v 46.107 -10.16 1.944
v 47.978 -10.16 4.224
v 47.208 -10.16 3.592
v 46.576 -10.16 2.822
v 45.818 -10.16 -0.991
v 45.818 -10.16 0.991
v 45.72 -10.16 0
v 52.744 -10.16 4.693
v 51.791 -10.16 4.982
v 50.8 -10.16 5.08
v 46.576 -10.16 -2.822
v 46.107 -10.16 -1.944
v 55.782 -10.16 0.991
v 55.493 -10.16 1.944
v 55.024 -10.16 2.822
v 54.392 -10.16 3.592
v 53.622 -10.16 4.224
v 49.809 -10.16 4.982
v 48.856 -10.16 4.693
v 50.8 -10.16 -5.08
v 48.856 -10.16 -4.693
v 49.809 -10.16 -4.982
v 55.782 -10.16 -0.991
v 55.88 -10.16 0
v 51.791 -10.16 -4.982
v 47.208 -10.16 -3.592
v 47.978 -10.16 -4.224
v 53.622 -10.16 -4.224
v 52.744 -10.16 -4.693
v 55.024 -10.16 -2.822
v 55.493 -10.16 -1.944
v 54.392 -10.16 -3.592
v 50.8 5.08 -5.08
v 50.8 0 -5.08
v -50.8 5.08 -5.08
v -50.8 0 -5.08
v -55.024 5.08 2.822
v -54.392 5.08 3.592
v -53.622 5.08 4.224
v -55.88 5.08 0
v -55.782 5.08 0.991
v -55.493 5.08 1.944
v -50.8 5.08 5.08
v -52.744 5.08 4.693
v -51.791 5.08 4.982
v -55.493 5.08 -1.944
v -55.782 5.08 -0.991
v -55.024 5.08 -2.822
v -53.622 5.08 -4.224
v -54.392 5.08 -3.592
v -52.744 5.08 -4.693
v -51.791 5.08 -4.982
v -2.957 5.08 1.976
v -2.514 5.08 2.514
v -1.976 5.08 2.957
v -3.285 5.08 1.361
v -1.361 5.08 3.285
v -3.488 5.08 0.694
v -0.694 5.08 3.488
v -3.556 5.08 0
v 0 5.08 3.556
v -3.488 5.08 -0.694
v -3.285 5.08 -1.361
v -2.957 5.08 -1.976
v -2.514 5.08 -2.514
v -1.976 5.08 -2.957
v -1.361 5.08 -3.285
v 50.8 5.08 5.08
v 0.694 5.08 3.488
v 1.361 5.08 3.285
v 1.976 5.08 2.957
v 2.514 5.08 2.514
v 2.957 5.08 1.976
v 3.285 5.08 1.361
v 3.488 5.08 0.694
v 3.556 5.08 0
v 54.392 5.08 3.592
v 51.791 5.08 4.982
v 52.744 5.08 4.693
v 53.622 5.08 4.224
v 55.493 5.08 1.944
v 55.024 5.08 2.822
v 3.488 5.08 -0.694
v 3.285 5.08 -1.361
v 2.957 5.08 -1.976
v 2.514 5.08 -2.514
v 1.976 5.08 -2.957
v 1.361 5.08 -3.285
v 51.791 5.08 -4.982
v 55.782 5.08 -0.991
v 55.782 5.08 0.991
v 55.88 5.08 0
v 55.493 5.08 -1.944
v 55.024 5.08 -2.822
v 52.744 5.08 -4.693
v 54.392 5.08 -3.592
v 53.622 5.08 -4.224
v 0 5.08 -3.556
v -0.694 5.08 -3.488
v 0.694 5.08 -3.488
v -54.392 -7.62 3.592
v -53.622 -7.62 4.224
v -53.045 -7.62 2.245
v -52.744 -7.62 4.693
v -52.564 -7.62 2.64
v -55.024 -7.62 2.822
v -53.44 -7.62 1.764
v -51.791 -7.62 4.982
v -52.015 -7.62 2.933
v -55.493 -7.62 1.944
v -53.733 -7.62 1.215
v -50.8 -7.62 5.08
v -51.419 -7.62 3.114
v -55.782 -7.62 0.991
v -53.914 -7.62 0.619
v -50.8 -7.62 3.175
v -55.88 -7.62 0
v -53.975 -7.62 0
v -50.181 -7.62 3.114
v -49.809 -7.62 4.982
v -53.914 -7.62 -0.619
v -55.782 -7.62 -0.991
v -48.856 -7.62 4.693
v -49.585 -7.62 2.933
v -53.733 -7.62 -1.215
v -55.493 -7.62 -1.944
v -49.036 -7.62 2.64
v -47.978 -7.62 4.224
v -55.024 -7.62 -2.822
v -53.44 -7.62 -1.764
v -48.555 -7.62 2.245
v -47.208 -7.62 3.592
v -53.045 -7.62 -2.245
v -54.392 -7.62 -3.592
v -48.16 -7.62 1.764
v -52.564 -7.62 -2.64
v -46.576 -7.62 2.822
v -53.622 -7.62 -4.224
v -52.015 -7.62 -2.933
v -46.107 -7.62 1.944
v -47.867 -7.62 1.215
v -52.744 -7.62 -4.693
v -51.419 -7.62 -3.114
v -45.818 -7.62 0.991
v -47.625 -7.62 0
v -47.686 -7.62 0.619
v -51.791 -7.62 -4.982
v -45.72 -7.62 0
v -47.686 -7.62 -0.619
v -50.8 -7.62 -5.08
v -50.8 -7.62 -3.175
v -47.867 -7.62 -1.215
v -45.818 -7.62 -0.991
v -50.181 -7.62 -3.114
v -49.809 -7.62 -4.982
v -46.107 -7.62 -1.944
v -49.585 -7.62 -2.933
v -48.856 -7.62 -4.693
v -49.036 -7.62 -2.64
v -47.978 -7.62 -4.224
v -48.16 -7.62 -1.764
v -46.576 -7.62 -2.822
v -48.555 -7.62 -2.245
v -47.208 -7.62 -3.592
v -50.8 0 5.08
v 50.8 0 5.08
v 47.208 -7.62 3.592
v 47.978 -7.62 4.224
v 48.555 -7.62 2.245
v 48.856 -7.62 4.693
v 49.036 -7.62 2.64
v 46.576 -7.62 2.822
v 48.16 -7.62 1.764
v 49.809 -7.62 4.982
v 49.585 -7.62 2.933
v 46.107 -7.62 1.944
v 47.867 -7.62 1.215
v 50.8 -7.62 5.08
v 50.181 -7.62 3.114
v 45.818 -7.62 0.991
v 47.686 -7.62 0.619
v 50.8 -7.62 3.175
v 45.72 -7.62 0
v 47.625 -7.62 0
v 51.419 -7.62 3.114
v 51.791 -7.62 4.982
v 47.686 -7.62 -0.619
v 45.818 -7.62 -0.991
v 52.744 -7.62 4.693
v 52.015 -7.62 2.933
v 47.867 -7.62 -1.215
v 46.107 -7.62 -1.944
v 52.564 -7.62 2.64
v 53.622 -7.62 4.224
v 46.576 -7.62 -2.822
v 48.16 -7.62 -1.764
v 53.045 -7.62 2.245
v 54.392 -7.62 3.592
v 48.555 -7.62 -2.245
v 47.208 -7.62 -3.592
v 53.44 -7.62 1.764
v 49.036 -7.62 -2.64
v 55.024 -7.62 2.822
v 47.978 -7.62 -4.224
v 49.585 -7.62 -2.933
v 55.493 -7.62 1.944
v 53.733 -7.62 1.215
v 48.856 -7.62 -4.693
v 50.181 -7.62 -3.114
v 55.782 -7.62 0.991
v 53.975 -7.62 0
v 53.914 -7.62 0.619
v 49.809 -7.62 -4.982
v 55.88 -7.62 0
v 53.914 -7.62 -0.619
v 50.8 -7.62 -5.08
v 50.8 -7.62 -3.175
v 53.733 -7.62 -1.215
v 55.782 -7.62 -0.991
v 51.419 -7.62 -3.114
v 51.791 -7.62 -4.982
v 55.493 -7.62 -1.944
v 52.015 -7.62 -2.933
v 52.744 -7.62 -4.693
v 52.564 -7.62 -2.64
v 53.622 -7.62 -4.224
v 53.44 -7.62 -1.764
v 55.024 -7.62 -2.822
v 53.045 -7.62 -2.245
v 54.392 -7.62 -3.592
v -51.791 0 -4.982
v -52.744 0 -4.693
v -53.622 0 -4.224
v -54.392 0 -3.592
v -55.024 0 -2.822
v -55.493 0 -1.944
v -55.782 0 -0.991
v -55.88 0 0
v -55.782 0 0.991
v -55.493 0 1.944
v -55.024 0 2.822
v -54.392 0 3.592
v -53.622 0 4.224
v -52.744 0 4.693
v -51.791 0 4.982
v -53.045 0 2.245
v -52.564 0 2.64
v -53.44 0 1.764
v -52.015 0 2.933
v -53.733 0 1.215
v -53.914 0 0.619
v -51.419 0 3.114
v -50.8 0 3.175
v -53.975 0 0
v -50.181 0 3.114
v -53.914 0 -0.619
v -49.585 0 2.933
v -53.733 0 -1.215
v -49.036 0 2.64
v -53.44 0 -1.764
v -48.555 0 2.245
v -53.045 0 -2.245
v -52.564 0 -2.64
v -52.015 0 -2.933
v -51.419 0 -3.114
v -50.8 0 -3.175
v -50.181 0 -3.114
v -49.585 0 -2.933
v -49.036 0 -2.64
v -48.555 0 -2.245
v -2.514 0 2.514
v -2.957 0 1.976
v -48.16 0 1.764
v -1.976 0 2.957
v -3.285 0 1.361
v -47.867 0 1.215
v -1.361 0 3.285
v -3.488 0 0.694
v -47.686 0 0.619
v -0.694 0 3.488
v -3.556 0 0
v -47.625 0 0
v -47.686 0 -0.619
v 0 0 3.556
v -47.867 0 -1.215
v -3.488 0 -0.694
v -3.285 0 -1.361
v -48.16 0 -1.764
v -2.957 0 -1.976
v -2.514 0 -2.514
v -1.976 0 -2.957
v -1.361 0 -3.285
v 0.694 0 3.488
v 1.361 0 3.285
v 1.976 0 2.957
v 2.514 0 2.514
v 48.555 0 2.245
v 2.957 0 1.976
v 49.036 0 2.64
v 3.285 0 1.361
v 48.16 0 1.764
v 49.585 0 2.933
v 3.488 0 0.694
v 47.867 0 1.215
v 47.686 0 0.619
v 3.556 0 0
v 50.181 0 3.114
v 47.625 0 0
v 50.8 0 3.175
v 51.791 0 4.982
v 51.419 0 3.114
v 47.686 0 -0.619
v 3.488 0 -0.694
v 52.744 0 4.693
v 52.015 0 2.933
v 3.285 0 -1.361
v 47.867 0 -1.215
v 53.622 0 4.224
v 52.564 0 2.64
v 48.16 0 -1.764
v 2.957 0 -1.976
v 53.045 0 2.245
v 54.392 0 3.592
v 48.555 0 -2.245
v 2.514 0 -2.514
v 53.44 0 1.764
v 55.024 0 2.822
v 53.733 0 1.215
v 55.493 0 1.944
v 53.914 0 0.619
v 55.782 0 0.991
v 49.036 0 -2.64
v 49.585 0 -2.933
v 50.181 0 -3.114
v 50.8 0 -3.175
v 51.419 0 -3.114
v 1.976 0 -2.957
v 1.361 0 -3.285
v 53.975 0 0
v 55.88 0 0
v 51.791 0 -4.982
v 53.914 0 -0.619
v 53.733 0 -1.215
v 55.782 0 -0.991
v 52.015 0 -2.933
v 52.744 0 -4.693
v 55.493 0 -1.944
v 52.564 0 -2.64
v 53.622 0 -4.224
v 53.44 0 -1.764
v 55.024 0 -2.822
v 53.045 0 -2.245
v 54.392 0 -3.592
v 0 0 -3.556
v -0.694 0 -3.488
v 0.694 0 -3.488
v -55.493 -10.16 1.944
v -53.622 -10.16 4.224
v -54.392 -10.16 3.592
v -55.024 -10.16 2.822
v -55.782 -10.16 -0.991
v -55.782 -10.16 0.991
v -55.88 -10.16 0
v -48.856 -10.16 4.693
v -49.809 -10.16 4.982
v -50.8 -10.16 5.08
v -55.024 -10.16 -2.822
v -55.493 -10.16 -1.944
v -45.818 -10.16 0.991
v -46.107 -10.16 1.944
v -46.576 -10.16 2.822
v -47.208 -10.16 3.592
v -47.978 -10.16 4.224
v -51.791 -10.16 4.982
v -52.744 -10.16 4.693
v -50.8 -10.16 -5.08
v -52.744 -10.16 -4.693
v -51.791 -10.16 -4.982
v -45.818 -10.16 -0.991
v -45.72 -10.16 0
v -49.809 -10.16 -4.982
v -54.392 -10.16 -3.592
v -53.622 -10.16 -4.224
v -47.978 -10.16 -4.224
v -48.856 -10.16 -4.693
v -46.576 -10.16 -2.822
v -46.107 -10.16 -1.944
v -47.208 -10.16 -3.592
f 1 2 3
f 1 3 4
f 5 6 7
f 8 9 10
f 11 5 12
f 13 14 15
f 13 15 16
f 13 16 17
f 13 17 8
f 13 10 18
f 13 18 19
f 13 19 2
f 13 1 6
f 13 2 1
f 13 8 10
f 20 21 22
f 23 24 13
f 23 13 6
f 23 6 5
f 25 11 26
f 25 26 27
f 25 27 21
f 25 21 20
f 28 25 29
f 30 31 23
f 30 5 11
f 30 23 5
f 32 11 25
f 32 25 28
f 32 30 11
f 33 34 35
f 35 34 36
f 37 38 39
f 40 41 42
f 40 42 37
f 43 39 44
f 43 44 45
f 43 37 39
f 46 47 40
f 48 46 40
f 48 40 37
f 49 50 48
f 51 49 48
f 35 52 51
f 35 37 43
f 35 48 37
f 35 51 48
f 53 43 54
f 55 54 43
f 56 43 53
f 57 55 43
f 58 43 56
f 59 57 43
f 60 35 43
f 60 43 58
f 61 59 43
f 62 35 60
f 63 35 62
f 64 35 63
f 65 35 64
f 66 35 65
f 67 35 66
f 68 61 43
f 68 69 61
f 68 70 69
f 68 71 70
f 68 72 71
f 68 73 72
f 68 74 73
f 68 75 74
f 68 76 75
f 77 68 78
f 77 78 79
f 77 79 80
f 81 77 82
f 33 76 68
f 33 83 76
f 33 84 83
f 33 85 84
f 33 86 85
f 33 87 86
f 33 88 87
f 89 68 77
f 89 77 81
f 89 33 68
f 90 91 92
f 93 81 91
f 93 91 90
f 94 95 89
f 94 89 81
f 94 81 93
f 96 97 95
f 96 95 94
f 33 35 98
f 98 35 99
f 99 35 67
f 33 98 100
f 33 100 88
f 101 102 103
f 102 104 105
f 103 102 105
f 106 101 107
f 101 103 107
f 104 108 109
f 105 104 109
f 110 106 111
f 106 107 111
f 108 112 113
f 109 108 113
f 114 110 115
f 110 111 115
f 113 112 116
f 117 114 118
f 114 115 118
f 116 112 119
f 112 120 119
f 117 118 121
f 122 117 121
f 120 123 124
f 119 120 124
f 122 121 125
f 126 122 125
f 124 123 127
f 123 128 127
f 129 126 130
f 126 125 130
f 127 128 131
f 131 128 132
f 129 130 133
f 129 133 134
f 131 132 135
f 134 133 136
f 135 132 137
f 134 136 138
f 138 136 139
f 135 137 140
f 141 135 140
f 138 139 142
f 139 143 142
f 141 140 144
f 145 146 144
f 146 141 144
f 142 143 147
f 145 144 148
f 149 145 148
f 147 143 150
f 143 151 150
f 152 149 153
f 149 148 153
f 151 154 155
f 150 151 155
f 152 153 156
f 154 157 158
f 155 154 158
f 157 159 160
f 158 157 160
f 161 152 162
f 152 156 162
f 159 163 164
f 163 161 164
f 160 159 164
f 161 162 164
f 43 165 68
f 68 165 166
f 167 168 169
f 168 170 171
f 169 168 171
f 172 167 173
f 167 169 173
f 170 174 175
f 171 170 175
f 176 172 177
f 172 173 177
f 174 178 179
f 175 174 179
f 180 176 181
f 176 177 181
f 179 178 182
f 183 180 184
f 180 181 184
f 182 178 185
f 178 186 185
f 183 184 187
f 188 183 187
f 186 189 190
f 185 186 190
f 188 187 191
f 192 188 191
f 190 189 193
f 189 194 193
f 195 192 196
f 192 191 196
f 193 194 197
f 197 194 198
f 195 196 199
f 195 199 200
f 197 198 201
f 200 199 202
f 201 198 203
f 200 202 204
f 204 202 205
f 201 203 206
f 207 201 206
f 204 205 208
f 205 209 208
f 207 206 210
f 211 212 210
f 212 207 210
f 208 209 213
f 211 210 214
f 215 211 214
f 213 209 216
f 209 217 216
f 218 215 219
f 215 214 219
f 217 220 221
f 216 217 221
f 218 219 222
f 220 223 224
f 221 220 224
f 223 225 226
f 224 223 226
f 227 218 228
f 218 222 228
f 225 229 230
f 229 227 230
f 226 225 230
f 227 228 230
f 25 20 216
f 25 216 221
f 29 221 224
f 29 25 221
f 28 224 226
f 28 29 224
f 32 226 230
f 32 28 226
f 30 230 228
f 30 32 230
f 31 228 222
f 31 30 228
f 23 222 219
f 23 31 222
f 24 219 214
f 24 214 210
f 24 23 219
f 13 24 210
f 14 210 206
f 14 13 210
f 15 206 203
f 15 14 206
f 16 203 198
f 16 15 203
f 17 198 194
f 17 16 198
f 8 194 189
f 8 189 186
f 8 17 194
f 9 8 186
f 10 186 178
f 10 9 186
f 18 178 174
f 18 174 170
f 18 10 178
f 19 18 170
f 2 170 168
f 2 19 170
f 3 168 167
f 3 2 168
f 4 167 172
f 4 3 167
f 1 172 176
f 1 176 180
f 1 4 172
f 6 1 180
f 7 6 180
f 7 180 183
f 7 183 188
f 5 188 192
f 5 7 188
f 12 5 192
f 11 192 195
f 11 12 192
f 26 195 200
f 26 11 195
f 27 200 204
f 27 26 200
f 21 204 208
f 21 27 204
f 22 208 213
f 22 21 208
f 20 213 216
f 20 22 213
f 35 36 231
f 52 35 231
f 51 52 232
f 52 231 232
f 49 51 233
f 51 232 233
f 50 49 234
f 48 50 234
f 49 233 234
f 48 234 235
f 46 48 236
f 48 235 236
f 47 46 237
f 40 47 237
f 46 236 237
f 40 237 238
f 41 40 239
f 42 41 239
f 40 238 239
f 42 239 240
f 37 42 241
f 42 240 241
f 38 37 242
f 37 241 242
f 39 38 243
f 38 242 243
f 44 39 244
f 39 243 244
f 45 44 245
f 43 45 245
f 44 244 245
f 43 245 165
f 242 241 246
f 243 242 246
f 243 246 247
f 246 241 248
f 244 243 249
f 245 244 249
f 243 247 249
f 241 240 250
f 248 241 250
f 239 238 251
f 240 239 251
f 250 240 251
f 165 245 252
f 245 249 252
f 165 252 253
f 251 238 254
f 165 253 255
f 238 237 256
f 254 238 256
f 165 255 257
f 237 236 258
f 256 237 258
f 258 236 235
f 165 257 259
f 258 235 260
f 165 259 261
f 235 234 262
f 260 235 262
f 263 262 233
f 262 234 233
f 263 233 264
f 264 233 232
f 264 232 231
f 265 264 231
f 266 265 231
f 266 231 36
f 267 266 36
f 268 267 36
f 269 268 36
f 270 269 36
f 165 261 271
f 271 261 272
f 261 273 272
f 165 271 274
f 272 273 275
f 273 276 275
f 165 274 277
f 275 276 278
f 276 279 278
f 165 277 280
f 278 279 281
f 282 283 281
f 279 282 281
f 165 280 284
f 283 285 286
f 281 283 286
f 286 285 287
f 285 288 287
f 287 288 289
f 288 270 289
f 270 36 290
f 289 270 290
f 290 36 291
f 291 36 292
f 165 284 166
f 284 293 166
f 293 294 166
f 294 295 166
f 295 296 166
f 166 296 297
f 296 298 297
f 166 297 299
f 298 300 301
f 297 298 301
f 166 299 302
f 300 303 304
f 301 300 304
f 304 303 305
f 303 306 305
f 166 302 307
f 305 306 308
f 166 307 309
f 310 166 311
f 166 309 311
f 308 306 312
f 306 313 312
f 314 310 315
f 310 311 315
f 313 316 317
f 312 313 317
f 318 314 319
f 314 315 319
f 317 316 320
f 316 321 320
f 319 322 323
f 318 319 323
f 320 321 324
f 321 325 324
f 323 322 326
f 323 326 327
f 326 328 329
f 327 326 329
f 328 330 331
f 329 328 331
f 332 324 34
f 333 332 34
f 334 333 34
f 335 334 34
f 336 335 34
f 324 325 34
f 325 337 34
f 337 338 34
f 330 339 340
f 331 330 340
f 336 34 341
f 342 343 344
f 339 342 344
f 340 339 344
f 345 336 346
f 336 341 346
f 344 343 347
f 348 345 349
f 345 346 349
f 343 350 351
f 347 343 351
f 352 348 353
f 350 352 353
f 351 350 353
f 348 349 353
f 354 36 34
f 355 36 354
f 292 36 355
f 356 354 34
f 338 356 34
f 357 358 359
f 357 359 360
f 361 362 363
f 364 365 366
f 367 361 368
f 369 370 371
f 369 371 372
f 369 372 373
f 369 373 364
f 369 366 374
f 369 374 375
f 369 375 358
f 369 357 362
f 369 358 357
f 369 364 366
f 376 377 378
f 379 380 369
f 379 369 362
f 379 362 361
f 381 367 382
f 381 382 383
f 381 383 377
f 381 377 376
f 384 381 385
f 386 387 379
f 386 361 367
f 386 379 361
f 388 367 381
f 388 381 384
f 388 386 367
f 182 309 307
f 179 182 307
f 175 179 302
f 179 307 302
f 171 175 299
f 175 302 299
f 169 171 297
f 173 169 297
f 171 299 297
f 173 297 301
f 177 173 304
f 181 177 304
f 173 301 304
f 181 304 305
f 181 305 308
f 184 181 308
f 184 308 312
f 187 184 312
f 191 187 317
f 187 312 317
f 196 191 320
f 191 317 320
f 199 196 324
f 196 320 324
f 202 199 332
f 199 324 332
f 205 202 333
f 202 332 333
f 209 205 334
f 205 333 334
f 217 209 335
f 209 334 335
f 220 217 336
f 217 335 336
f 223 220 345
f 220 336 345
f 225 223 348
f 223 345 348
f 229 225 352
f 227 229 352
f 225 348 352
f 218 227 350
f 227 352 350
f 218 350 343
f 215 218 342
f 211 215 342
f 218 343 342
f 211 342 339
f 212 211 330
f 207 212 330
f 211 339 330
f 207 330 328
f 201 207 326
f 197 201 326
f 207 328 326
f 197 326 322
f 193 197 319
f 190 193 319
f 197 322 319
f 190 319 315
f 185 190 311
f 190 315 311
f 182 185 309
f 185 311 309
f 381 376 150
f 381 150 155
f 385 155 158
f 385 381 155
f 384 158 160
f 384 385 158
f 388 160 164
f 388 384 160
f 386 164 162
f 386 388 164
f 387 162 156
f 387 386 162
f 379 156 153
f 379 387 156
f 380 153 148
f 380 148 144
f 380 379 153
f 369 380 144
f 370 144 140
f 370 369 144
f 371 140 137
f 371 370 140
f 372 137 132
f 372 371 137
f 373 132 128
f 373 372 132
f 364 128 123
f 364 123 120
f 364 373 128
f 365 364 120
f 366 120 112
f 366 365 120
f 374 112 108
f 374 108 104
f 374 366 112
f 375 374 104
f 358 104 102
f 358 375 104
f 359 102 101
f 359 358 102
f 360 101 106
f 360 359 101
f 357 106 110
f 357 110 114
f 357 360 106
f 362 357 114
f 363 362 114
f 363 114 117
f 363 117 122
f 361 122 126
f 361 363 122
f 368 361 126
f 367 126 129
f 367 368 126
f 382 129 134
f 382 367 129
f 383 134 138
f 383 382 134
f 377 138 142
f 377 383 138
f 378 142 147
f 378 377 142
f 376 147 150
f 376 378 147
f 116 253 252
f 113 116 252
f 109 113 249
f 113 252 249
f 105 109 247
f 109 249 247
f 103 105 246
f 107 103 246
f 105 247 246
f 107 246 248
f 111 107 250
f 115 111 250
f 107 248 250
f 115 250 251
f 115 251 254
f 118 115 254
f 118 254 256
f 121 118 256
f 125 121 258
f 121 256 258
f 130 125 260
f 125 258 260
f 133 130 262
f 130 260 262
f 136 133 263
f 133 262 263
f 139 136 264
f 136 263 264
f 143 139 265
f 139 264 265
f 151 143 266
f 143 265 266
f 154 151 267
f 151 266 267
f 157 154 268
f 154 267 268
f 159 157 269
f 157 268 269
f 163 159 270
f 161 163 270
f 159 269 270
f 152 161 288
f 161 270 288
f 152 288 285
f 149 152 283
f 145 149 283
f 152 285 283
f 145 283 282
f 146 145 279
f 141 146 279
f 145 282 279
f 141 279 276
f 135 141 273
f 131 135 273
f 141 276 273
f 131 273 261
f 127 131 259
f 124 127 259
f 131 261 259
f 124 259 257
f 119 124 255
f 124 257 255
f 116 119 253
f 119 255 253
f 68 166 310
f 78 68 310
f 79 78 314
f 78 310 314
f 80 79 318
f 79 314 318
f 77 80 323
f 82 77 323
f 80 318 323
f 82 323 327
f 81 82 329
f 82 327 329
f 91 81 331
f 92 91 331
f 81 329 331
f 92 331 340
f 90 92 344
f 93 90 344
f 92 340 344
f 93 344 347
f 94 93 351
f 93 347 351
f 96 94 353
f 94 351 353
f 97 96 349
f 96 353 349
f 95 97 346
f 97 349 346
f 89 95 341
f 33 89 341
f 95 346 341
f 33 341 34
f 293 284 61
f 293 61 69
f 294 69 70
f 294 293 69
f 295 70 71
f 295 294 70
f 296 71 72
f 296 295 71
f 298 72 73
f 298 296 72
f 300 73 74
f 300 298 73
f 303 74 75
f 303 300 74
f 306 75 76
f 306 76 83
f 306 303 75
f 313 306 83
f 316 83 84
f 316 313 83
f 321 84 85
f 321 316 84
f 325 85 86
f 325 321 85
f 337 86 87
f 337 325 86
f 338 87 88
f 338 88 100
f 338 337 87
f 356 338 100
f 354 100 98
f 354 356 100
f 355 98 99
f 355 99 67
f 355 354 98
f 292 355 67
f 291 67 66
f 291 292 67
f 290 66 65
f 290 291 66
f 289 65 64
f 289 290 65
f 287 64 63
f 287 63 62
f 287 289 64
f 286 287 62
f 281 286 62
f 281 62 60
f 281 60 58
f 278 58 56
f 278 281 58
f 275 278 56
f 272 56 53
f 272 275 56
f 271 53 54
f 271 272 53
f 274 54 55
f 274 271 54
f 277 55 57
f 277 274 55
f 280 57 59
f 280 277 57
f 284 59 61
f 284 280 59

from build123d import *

# Parameters (mm, degrees)
BOSS_EXTRUDE1_DEPTH = 5.08
SKETCH3_R           = 3.175
BOSS_EXTRUDE2_DEPTH = 7.62
BOSS_EXTRUDE3_START = 2.54
SKETCH4_R           = 5.08
BOSS_EXTRUDE3_DEPTH = 2.54
SKETCH7_R           = 3.556
CUT_EXTRUDE1_DEPTH  = 5.08


with BuildPart() as part:
    # Sketch2 → Boss-Extrude1 (new body)
    with BuildSketch(Plane(origin=(0, 0, 0), x_dir=(1, 0, 0), z_dir=(0, 1, 0))):
        with BuildLine():
            Line((-50.8, -5.08), (50.8, -5.08))
            ThreePointArc((50.8, -5.08), (55.88, 0), (50.8, 5.08))
            Line((50.8, 5.08), (-50.8, 5.08))
            ThreePointArc((-50.8, 5.08), (-55.88, 0), (-50.8, -5.08))
        make_face()
    extrude(amount=BOSS_EXTRUDE1_DEPTH)

    # Sketch3 → Boss-Extrude2 (add)
    with BuildSketch(Plane.XZ):
        with Locations(Location((-50.8, 0, 0), (0, 0, 90))):
            Circle(SKETCH3_R)
        with Locations(Location((50.8, 0, 0), (0, 0, 90))):
            Circle(SKETCH3_R)
    extrude(amount=BOSS_EXTRUDE2_DEPTH)

    # Sketch4 → Boss-Extrude3 (add)
    with BuildSketch(Plane.XZ.offset(7.62).offset(BOSS_EXTRUDE3_START)):
        with Locations(Location((-50.8, 0, 0), (0, 0, 270))):
            Circle(SKETCH4_R)
        with Locations(Location((50.8, 0, 0), (0, 0, 270))):
            Circle(SKETCH4_R)
    extrude(amount=-BOSS_EXTRUDE3_DEPTH)

    # Sketch7 → Cut-Extrude1 (cut)
    with BuildSketch(Plane(origin=(0, 0, 0), x_dir=(1, 0, 0), z_dir=(0, 1, 0))):
        with Locations(Location((0, 0, 0), (0, 0, 270))):
            Circle(SKETCH7_R)
    extrude(amount=CUT_EXTRUDE1_DEPTH, mode=Mode.SUBTRACT)


solid = part.part
